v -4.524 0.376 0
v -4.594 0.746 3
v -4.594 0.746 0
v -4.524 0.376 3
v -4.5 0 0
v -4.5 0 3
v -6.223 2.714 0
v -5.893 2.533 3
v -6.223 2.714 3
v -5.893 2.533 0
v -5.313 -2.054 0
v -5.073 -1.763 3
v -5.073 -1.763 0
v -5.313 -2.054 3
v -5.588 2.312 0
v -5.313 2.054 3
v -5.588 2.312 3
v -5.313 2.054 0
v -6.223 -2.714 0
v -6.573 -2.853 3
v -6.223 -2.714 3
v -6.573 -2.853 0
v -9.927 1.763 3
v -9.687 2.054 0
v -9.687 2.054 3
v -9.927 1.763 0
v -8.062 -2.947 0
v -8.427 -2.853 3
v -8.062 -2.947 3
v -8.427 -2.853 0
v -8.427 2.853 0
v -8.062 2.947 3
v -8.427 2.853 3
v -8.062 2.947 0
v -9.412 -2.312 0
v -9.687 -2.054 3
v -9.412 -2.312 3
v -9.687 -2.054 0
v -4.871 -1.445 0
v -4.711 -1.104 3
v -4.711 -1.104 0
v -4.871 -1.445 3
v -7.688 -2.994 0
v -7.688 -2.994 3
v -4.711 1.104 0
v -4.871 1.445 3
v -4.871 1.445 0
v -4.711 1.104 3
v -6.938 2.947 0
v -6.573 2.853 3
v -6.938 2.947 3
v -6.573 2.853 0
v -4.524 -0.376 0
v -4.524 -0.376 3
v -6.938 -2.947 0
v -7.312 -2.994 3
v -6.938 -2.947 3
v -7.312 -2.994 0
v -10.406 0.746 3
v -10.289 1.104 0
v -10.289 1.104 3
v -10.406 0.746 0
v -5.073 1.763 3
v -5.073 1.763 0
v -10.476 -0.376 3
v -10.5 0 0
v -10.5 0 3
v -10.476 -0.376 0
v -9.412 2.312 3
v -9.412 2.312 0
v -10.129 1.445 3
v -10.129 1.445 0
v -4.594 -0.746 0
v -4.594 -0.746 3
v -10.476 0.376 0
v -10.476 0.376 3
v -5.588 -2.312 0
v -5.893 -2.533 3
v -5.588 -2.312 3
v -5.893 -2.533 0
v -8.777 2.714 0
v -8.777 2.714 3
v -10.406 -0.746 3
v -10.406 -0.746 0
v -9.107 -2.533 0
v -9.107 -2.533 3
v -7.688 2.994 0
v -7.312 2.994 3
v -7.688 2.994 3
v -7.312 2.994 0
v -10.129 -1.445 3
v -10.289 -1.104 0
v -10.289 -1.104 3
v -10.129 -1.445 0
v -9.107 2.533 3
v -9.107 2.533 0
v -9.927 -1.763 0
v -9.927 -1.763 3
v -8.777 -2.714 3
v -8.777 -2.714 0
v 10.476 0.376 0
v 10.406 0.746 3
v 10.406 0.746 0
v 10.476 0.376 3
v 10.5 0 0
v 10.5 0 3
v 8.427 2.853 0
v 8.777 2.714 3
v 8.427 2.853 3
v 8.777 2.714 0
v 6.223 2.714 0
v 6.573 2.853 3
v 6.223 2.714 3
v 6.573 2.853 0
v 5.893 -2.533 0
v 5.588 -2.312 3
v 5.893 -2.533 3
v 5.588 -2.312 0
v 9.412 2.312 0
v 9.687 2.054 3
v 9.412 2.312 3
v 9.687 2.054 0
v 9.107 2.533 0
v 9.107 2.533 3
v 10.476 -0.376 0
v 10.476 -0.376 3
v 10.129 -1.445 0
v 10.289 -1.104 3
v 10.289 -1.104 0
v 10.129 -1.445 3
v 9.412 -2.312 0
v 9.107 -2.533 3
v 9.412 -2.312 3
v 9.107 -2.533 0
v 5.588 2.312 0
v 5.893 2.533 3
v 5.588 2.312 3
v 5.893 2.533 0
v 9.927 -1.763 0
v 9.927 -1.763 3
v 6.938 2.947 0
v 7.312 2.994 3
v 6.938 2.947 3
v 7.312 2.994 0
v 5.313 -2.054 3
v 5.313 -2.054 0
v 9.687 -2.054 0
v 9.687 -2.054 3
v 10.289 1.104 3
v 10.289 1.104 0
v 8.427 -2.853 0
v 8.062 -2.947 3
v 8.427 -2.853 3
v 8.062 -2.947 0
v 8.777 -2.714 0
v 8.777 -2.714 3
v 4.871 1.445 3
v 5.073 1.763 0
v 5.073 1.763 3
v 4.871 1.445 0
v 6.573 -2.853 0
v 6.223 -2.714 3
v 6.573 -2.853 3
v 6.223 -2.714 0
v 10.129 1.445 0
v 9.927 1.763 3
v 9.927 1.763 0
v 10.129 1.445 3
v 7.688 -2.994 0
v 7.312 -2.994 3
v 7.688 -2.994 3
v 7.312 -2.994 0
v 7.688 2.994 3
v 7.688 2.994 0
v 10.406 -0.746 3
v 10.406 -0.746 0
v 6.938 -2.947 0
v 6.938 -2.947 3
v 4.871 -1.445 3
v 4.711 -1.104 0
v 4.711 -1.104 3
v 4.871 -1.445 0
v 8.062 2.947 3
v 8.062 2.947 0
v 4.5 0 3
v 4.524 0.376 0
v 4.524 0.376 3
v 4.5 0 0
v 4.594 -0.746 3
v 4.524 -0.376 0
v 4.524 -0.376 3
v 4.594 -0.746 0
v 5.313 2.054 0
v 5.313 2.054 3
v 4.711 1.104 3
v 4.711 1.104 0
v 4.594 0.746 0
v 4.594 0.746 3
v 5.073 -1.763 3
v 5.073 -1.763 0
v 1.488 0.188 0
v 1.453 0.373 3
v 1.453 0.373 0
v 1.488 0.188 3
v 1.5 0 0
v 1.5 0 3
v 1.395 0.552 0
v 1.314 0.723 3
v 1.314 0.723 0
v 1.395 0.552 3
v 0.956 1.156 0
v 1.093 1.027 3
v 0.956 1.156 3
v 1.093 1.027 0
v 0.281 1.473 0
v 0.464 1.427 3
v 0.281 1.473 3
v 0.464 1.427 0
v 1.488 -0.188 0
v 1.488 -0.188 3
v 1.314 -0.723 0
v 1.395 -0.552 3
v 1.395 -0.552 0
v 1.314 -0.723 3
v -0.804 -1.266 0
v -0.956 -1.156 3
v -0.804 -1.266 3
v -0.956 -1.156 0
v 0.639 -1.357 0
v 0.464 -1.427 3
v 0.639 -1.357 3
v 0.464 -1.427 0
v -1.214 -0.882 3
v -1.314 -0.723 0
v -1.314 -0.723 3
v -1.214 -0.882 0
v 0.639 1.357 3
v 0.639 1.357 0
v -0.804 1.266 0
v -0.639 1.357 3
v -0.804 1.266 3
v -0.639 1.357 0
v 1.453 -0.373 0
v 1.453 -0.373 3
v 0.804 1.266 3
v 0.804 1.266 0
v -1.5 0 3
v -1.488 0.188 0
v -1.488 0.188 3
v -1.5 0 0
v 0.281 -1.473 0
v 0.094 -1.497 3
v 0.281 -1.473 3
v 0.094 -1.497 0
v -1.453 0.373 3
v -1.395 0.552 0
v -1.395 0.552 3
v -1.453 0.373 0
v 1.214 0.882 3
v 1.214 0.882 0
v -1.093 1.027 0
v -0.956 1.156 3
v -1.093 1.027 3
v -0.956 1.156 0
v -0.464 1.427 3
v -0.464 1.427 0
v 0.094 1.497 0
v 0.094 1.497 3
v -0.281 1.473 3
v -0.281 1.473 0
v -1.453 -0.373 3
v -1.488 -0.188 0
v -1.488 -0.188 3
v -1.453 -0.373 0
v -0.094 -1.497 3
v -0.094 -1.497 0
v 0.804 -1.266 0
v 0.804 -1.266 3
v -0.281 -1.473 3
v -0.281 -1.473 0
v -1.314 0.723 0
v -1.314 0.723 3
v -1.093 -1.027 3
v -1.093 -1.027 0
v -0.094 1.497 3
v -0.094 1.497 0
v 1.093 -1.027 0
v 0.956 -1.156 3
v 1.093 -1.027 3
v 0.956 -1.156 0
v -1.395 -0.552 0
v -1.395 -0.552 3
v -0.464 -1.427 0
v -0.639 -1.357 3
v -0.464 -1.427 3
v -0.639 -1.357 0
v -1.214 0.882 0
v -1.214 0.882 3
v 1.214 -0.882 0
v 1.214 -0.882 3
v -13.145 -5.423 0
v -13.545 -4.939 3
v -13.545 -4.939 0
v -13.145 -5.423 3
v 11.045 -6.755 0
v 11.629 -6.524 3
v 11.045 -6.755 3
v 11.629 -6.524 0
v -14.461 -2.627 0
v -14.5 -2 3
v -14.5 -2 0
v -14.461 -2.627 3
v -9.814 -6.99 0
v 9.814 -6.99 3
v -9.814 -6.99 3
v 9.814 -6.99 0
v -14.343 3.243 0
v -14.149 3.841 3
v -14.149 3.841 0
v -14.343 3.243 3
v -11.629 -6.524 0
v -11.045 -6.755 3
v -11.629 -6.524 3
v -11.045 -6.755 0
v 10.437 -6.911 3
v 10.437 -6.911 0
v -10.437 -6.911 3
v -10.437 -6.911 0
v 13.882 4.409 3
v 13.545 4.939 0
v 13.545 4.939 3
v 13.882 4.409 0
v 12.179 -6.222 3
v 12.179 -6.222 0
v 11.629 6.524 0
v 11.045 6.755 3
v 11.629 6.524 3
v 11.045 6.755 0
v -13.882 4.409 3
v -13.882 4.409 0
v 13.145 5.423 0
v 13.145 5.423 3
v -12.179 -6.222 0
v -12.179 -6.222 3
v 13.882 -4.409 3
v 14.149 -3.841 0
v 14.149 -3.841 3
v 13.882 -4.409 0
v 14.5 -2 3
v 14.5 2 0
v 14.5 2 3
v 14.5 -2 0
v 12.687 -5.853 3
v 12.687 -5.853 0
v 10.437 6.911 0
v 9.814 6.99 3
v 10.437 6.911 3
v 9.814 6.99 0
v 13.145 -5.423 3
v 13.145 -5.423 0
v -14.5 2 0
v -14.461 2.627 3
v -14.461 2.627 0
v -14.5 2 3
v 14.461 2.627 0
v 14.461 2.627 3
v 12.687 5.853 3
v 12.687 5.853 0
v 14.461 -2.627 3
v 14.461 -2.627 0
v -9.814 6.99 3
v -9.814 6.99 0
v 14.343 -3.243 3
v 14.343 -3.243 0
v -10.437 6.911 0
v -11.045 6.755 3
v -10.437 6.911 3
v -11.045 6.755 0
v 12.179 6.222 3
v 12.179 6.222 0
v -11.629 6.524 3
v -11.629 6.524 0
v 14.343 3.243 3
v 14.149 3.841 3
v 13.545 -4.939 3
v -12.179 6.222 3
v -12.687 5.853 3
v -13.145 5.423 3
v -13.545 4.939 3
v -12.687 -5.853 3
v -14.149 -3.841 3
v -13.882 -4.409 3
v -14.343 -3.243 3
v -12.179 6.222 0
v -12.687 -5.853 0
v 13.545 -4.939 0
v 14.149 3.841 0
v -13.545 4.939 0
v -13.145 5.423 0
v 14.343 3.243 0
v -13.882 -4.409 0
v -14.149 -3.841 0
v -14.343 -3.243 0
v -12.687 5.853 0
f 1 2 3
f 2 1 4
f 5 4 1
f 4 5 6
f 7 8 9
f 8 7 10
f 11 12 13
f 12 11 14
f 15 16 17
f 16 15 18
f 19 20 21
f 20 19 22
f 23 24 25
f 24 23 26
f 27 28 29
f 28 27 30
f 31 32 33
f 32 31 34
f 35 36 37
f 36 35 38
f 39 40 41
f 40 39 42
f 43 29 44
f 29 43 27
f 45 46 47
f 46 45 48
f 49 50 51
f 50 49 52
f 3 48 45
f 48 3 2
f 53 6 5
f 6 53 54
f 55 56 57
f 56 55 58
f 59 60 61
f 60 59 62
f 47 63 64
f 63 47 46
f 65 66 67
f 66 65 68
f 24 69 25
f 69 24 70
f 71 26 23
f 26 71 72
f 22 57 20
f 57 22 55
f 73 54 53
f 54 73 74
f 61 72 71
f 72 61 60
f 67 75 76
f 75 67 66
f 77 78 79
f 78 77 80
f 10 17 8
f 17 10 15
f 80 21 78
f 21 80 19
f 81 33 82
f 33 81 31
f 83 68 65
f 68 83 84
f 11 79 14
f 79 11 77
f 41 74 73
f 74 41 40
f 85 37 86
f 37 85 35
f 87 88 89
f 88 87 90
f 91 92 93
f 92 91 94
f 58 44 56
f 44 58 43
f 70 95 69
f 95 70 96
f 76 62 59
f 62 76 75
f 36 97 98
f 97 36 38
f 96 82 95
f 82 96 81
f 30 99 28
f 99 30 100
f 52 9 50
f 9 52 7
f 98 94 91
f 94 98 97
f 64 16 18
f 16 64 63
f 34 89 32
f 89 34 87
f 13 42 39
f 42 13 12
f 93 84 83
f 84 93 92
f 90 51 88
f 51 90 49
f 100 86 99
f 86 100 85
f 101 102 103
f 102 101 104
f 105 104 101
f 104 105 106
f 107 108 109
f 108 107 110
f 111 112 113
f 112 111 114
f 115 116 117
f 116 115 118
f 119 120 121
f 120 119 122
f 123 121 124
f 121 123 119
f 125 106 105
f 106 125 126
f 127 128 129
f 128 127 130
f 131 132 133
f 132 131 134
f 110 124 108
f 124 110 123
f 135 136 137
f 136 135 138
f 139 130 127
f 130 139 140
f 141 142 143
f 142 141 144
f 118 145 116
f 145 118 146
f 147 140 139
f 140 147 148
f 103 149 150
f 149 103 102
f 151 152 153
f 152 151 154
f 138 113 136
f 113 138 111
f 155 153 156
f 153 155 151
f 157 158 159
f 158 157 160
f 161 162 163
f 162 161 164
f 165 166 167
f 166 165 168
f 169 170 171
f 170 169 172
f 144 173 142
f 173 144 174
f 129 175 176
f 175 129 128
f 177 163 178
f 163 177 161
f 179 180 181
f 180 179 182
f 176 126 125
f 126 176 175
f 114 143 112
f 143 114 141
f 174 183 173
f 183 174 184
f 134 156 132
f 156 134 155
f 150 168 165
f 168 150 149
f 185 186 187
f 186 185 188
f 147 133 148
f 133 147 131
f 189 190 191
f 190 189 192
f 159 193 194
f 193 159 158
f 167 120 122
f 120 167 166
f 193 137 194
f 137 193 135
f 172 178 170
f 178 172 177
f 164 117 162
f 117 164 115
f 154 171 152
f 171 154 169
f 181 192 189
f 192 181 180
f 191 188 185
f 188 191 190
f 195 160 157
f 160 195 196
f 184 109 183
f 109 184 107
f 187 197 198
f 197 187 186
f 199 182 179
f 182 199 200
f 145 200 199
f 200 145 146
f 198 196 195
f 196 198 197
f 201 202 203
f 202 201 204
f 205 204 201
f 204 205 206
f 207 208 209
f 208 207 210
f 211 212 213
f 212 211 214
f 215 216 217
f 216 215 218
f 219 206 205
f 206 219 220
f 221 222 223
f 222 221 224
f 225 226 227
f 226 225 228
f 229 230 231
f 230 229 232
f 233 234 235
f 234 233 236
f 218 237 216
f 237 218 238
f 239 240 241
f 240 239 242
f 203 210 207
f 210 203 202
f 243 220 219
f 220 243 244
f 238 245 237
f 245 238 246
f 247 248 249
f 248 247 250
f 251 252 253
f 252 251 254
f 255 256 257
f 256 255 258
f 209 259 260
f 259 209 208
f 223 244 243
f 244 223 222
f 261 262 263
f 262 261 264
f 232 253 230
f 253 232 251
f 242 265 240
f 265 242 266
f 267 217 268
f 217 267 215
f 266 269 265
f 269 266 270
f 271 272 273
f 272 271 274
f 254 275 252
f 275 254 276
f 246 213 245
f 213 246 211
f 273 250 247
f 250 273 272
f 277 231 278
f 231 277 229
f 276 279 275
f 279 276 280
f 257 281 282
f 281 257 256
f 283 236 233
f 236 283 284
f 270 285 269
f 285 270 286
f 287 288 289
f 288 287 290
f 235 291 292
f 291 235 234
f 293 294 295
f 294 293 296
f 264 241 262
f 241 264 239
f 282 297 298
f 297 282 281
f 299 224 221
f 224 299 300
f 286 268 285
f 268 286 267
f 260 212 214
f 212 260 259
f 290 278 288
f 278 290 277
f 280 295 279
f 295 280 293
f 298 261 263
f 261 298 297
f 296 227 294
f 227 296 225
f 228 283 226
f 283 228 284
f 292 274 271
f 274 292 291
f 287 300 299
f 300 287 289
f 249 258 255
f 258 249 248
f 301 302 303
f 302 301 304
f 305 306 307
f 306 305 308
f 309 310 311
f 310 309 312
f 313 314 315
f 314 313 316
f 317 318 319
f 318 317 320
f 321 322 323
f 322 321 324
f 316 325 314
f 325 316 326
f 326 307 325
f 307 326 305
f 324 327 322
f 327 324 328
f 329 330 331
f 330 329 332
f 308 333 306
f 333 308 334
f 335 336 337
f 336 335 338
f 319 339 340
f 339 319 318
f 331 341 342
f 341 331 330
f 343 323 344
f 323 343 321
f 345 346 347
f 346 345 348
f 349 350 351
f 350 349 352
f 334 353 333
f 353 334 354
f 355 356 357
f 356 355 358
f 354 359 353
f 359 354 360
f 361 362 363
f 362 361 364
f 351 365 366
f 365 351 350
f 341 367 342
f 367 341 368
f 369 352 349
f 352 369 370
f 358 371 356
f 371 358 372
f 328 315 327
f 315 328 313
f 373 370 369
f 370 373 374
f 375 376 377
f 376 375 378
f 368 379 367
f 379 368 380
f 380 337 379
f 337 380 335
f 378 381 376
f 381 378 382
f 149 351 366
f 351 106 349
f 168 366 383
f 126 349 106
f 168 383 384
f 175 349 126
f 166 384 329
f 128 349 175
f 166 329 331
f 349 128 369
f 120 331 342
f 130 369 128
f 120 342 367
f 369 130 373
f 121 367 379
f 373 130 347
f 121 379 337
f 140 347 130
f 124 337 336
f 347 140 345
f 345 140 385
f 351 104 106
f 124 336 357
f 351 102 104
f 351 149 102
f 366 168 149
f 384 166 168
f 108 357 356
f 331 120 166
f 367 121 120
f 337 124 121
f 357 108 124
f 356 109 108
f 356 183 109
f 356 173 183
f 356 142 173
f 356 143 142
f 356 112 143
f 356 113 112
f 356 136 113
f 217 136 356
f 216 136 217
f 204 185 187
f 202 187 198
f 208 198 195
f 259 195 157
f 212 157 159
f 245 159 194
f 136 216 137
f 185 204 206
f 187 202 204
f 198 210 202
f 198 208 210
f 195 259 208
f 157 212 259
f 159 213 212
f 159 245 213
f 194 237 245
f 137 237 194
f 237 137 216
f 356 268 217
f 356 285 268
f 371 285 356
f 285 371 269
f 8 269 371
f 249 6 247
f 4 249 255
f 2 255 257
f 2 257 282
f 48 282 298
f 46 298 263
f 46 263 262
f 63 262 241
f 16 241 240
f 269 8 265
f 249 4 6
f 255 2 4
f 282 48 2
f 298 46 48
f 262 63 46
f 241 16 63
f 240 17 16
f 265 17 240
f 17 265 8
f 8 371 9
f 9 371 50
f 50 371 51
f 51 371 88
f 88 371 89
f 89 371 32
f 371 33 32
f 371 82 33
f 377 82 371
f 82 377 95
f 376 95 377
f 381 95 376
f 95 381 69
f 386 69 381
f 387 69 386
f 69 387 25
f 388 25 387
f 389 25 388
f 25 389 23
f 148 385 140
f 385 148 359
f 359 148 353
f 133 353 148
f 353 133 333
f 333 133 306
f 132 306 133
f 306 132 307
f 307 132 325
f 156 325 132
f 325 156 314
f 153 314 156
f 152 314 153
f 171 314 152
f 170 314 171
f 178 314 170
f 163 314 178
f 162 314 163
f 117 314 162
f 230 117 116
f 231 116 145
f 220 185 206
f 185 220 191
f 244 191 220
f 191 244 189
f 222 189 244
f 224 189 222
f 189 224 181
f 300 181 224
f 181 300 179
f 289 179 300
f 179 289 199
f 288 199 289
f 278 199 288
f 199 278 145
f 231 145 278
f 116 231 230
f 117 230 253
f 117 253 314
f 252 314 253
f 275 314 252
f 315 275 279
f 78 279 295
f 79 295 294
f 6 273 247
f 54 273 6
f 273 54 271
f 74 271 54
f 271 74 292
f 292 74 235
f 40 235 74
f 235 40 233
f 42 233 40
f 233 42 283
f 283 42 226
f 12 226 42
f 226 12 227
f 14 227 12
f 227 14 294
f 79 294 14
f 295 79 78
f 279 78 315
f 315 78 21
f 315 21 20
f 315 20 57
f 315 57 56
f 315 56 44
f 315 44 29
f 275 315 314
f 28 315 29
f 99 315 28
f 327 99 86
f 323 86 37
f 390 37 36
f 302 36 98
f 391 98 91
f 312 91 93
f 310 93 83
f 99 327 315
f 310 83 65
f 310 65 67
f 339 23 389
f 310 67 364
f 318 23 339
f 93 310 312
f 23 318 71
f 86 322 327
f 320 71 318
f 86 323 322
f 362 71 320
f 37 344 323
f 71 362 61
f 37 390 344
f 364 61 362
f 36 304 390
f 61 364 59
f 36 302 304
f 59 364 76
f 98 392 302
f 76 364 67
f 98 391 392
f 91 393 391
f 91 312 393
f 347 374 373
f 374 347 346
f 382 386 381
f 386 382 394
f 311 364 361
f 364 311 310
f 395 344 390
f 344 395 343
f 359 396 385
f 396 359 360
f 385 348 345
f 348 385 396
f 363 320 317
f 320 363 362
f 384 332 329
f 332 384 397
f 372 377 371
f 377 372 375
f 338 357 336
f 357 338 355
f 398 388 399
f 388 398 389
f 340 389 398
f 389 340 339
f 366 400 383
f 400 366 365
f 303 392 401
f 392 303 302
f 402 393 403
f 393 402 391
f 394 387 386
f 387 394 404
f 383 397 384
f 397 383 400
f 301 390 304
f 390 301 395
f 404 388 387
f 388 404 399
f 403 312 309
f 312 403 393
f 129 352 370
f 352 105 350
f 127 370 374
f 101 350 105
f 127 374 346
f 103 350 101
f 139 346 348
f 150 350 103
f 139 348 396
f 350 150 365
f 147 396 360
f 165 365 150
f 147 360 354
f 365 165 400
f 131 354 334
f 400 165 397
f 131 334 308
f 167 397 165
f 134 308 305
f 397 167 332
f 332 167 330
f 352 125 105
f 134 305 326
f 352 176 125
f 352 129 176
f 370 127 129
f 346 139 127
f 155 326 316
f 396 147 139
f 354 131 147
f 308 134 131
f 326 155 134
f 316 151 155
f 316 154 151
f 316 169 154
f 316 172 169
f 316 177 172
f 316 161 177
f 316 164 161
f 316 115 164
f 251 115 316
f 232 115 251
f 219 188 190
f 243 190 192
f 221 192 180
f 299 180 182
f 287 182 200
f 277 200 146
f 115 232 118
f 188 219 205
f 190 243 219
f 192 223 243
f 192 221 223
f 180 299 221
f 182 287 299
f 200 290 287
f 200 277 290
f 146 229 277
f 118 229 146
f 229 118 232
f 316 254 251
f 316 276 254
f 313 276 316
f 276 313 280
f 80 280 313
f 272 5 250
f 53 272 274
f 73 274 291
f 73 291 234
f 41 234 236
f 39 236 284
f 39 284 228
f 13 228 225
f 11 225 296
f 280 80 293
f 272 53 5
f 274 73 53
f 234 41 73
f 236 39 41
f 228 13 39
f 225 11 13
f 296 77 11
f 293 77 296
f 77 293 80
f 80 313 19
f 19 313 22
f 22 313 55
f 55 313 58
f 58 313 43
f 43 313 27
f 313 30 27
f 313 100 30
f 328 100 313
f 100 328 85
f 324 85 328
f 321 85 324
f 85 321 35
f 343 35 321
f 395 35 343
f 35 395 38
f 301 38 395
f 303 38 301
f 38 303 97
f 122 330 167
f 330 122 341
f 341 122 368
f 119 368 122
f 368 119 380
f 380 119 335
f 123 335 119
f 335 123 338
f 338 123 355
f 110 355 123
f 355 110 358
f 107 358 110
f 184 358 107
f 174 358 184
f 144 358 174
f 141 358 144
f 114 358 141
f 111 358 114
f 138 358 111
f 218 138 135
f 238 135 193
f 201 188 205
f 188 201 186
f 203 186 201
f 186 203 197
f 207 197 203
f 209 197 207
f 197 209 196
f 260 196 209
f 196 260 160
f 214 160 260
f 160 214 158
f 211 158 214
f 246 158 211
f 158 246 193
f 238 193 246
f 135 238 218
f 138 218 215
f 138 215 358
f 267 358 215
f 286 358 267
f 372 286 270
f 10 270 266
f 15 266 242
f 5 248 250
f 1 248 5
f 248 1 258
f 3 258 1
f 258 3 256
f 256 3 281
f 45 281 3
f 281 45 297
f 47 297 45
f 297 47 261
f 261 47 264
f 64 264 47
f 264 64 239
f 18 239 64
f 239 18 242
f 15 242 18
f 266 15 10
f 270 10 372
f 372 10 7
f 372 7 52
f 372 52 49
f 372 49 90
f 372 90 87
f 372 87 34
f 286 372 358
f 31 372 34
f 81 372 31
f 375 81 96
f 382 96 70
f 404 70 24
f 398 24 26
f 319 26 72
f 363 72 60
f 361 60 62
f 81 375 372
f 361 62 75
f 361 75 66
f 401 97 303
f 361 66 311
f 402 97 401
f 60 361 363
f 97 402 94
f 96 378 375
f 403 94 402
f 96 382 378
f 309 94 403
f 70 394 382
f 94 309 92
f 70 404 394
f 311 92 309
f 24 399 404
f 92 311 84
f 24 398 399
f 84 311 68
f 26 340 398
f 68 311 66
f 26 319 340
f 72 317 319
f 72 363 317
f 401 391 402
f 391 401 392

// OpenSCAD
$fn = 50;


difference() {
	union() {
		hull() {
			translate(v = [-9.5000000000, 2.0000000000, 0]) {
				cylinder(h = 3, r = 5);
			}
			translate(v = [9.5000000000, 2.0000000000, 0]) {
				cylinder(h = 3, r = 5);
			}
			translate(v = [-9.5000000000, -2.0000000000, 0]) {
				cylinder(h = 3, r = 5);
			}
			translate(v = [9.5000000000, -2.0000000000, 0]) {
				cylinder(h = 3, r = 5);
			}
		}
	}
	union() {
		translate(v = [-7.5000000000, 0.0000000000, 0]) {
			translate(v = [0, 0, -100]) {
				cylinder(h = 200, r = 3.0000000000);
			}
		}
		translate(v = [7.5000000000, 0.0000000000, 0]) {
			translate(v = [0, 0, -100]) {
				cylinder(h = 200, r = 3.0000000000);
			}
		}
		translate(v = [-7.5000000000, 0.0000000000, 0]) {
			translate(v = [0, 0, -100]) {
				cylinder(h = 200, r = 1.5000000000);
			}
		}
		translate(v = [0, 0, -100]) {
			cylinder(h = 200, r = 1.5000000000);
		}
		translate(v = [7.5000000000, 0.0000000000, 0]) {
			translate(v = [0, 0, -100]) {
				cylinder(h = 200, r = 1.5000000000);
			}
		}
	}
}
